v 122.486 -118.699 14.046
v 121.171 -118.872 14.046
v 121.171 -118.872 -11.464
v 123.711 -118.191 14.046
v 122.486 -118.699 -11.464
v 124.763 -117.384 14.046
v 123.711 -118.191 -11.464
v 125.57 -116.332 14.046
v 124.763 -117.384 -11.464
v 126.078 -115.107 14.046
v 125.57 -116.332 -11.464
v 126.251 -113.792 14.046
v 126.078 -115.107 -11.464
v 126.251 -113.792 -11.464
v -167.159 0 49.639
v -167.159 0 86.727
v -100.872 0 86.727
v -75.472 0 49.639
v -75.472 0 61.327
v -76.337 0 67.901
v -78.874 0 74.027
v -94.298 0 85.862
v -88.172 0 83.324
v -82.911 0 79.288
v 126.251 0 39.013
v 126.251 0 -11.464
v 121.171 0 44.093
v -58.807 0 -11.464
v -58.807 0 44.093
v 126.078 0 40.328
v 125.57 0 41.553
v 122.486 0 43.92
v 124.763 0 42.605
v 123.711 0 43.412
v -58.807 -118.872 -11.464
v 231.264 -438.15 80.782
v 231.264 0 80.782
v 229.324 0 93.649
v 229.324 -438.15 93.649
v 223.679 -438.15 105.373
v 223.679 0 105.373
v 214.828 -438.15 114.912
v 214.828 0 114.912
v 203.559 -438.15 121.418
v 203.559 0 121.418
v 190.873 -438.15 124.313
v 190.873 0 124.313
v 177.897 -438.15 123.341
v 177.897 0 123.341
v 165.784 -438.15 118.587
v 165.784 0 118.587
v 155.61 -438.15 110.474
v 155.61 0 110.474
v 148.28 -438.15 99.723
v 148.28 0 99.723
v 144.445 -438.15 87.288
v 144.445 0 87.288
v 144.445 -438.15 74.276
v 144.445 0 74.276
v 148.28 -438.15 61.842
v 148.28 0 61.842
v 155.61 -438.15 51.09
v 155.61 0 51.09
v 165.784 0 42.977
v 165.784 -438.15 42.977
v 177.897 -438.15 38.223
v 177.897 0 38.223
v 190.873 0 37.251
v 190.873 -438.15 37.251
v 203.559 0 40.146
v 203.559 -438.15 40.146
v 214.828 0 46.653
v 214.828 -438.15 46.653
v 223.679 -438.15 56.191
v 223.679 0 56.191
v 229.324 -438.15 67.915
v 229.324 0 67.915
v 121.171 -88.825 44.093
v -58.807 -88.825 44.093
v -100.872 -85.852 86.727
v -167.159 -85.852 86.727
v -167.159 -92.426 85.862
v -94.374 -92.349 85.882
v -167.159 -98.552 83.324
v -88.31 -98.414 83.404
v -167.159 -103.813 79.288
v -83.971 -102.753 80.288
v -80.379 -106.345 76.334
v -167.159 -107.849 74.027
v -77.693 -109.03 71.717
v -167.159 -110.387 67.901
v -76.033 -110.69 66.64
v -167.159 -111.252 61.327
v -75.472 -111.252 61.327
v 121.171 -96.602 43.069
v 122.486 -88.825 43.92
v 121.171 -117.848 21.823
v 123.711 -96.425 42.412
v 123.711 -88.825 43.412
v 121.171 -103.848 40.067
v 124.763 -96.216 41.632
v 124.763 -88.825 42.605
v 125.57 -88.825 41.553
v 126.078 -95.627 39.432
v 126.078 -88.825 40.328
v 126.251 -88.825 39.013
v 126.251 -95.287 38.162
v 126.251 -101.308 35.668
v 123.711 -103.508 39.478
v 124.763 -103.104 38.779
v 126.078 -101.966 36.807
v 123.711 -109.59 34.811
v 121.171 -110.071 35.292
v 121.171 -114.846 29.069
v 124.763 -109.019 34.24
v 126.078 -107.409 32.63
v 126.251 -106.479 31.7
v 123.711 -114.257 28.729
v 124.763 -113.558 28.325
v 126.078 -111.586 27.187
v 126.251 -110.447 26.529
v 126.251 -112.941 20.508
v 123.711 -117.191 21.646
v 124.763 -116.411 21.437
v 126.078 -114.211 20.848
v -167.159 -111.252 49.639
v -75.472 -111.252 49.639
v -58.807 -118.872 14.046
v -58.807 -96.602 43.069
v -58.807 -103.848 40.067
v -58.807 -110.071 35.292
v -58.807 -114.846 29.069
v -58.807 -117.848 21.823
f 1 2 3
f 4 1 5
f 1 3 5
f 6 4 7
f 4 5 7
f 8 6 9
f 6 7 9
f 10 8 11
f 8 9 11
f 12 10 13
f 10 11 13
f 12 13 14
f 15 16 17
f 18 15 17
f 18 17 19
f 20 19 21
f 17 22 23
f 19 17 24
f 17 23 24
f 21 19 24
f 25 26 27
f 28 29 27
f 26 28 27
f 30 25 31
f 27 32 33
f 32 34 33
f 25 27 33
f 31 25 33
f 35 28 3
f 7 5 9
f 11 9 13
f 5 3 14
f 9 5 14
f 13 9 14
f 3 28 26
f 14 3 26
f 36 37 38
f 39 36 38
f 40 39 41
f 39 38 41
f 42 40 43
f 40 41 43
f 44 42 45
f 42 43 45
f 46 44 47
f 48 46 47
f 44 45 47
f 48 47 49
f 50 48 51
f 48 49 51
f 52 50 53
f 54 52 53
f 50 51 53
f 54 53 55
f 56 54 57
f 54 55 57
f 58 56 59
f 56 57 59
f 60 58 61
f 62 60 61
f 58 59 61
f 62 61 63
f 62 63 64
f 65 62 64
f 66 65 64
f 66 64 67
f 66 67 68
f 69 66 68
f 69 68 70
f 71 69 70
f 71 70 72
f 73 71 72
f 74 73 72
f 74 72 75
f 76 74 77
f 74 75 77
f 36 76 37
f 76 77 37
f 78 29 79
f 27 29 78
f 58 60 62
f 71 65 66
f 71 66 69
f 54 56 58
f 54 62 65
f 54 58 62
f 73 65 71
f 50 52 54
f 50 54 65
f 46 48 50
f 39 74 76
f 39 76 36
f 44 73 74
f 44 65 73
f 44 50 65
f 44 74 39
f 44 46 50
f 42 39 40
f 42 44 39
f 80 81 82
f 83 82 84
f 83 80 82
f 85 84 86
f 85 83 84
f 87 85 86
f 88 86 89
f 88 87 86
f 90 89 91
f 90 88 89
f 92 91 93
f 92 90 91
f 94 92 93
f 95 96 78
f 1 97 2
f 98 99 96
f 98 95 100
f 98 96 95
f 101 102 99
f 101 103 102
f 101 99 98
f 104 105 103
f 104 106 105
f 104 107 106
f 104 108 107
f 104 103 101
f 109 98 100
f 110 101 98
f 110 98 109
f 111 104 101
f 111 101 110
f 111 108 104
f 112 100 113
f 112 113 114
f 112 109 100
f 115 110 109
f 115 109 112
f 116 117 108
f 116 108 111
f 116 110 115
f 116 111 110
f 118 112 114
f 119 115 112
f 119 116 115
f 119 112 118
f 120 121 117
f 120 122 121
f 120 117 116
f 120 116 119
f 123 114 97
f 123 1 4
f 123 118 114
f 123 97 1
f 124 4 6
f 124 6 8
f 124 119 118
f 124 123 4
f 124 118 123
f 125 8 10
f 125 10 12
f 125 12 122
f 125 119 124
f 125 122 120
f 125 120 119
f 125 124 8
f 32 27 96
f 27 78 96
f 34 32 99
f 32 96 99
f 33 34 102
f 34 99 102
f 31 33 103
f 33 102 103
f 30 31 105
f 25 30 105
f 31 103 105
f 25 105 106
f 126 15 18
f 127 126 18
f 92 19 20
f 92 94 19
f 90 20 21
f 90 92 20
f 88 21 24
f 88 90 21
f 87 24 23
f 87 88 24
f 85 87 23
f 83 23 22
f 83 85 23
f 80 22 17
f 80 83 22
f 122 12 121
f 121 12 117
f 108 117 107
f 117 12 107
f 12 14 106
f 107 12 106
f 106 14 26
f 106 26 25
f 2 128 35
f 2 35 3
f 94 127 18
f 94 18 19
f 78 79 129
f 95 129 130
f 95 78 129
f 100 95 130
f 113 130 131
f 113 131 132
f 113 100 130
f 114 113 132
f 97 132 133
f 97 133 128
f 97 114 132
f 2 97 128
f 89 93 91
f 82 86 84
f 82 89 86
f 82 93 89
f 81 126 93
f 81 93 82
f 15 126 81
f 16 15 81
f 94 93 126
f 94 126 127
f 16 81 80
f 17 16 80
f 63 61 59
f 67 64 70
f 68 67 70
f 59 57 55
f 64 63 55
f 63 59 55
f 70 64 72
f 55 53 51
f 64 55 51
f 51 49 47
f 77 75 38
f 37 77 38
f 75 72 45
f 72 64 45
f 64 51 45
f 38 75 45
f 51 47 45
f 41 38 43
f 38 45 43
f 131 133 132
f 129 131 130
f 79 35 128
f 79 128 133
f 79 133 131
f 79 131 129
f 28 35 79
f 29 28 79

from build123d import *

# Parameters (mm, degrees)
F0_W     = 185.058508
F0_H     = 55.5571
F1_DEPTH = 118.872
F2_R     = 30.047302
F3_R     = 5.08
F4_W     = 91.687955
F4_H     = 37.088386
F5_DEPTH = 111.252
F6_R     = 43.653388
F7_DEPTH = 438.15
F8_R     = 25.4


with BuildPart() as f1:
    # F0 (on Front) → F1 (new body)
    with BuildSketch(Plane.XZ):
        with Locations((33.721773, 16.314493)):
            Rectangle(F0_W, F0_H)
    extrude(amount=F1_DEPTH)

    # F2
    f2_edges = [f1.edges().sort_by_distance(p)[0] for p in [
        (33.721773, -118.872, 44.093043),
    ]]
    fillet(f2_edges, radius=F2_R)

    # F3
    f3_edges = [f1.edges().sort_by_distance(p)[0] for p in [
        (126.251027, -44.412349, 44.093043),
    ]]
    fillet(f3_edges, radius=F3_R)


with BuildPart() as f5:
    # F4 (on Front) → F5 (new body)
    with BuildSketch(Plane.XZ):
        with Locations((-121.315491, 68.183232)):
            Rectangle(F4_W, F4_H)
    extrude(amount=F5_DEPTH)

    # F8
    f8_edges = [f5.edges().sort_by_distance(p)[0] for p in [
        (-75.471513, -55.626, 86.727425),
        (-121.31549, -111.252, 86.727425),
    ]]
    fillet(f8_edges, radius=F8_R)


with BuildPart() as f7:
    # F6 (on Front) → F7 (new body)
    with BuildSketch(Plane.XZ):
        with Locations((187.610418, 80.782175)):
            Circle(F6_R)
    extrude(amount=F7_DEPTH)


solid = Compound([f1.part, f5.part, f7.part])
